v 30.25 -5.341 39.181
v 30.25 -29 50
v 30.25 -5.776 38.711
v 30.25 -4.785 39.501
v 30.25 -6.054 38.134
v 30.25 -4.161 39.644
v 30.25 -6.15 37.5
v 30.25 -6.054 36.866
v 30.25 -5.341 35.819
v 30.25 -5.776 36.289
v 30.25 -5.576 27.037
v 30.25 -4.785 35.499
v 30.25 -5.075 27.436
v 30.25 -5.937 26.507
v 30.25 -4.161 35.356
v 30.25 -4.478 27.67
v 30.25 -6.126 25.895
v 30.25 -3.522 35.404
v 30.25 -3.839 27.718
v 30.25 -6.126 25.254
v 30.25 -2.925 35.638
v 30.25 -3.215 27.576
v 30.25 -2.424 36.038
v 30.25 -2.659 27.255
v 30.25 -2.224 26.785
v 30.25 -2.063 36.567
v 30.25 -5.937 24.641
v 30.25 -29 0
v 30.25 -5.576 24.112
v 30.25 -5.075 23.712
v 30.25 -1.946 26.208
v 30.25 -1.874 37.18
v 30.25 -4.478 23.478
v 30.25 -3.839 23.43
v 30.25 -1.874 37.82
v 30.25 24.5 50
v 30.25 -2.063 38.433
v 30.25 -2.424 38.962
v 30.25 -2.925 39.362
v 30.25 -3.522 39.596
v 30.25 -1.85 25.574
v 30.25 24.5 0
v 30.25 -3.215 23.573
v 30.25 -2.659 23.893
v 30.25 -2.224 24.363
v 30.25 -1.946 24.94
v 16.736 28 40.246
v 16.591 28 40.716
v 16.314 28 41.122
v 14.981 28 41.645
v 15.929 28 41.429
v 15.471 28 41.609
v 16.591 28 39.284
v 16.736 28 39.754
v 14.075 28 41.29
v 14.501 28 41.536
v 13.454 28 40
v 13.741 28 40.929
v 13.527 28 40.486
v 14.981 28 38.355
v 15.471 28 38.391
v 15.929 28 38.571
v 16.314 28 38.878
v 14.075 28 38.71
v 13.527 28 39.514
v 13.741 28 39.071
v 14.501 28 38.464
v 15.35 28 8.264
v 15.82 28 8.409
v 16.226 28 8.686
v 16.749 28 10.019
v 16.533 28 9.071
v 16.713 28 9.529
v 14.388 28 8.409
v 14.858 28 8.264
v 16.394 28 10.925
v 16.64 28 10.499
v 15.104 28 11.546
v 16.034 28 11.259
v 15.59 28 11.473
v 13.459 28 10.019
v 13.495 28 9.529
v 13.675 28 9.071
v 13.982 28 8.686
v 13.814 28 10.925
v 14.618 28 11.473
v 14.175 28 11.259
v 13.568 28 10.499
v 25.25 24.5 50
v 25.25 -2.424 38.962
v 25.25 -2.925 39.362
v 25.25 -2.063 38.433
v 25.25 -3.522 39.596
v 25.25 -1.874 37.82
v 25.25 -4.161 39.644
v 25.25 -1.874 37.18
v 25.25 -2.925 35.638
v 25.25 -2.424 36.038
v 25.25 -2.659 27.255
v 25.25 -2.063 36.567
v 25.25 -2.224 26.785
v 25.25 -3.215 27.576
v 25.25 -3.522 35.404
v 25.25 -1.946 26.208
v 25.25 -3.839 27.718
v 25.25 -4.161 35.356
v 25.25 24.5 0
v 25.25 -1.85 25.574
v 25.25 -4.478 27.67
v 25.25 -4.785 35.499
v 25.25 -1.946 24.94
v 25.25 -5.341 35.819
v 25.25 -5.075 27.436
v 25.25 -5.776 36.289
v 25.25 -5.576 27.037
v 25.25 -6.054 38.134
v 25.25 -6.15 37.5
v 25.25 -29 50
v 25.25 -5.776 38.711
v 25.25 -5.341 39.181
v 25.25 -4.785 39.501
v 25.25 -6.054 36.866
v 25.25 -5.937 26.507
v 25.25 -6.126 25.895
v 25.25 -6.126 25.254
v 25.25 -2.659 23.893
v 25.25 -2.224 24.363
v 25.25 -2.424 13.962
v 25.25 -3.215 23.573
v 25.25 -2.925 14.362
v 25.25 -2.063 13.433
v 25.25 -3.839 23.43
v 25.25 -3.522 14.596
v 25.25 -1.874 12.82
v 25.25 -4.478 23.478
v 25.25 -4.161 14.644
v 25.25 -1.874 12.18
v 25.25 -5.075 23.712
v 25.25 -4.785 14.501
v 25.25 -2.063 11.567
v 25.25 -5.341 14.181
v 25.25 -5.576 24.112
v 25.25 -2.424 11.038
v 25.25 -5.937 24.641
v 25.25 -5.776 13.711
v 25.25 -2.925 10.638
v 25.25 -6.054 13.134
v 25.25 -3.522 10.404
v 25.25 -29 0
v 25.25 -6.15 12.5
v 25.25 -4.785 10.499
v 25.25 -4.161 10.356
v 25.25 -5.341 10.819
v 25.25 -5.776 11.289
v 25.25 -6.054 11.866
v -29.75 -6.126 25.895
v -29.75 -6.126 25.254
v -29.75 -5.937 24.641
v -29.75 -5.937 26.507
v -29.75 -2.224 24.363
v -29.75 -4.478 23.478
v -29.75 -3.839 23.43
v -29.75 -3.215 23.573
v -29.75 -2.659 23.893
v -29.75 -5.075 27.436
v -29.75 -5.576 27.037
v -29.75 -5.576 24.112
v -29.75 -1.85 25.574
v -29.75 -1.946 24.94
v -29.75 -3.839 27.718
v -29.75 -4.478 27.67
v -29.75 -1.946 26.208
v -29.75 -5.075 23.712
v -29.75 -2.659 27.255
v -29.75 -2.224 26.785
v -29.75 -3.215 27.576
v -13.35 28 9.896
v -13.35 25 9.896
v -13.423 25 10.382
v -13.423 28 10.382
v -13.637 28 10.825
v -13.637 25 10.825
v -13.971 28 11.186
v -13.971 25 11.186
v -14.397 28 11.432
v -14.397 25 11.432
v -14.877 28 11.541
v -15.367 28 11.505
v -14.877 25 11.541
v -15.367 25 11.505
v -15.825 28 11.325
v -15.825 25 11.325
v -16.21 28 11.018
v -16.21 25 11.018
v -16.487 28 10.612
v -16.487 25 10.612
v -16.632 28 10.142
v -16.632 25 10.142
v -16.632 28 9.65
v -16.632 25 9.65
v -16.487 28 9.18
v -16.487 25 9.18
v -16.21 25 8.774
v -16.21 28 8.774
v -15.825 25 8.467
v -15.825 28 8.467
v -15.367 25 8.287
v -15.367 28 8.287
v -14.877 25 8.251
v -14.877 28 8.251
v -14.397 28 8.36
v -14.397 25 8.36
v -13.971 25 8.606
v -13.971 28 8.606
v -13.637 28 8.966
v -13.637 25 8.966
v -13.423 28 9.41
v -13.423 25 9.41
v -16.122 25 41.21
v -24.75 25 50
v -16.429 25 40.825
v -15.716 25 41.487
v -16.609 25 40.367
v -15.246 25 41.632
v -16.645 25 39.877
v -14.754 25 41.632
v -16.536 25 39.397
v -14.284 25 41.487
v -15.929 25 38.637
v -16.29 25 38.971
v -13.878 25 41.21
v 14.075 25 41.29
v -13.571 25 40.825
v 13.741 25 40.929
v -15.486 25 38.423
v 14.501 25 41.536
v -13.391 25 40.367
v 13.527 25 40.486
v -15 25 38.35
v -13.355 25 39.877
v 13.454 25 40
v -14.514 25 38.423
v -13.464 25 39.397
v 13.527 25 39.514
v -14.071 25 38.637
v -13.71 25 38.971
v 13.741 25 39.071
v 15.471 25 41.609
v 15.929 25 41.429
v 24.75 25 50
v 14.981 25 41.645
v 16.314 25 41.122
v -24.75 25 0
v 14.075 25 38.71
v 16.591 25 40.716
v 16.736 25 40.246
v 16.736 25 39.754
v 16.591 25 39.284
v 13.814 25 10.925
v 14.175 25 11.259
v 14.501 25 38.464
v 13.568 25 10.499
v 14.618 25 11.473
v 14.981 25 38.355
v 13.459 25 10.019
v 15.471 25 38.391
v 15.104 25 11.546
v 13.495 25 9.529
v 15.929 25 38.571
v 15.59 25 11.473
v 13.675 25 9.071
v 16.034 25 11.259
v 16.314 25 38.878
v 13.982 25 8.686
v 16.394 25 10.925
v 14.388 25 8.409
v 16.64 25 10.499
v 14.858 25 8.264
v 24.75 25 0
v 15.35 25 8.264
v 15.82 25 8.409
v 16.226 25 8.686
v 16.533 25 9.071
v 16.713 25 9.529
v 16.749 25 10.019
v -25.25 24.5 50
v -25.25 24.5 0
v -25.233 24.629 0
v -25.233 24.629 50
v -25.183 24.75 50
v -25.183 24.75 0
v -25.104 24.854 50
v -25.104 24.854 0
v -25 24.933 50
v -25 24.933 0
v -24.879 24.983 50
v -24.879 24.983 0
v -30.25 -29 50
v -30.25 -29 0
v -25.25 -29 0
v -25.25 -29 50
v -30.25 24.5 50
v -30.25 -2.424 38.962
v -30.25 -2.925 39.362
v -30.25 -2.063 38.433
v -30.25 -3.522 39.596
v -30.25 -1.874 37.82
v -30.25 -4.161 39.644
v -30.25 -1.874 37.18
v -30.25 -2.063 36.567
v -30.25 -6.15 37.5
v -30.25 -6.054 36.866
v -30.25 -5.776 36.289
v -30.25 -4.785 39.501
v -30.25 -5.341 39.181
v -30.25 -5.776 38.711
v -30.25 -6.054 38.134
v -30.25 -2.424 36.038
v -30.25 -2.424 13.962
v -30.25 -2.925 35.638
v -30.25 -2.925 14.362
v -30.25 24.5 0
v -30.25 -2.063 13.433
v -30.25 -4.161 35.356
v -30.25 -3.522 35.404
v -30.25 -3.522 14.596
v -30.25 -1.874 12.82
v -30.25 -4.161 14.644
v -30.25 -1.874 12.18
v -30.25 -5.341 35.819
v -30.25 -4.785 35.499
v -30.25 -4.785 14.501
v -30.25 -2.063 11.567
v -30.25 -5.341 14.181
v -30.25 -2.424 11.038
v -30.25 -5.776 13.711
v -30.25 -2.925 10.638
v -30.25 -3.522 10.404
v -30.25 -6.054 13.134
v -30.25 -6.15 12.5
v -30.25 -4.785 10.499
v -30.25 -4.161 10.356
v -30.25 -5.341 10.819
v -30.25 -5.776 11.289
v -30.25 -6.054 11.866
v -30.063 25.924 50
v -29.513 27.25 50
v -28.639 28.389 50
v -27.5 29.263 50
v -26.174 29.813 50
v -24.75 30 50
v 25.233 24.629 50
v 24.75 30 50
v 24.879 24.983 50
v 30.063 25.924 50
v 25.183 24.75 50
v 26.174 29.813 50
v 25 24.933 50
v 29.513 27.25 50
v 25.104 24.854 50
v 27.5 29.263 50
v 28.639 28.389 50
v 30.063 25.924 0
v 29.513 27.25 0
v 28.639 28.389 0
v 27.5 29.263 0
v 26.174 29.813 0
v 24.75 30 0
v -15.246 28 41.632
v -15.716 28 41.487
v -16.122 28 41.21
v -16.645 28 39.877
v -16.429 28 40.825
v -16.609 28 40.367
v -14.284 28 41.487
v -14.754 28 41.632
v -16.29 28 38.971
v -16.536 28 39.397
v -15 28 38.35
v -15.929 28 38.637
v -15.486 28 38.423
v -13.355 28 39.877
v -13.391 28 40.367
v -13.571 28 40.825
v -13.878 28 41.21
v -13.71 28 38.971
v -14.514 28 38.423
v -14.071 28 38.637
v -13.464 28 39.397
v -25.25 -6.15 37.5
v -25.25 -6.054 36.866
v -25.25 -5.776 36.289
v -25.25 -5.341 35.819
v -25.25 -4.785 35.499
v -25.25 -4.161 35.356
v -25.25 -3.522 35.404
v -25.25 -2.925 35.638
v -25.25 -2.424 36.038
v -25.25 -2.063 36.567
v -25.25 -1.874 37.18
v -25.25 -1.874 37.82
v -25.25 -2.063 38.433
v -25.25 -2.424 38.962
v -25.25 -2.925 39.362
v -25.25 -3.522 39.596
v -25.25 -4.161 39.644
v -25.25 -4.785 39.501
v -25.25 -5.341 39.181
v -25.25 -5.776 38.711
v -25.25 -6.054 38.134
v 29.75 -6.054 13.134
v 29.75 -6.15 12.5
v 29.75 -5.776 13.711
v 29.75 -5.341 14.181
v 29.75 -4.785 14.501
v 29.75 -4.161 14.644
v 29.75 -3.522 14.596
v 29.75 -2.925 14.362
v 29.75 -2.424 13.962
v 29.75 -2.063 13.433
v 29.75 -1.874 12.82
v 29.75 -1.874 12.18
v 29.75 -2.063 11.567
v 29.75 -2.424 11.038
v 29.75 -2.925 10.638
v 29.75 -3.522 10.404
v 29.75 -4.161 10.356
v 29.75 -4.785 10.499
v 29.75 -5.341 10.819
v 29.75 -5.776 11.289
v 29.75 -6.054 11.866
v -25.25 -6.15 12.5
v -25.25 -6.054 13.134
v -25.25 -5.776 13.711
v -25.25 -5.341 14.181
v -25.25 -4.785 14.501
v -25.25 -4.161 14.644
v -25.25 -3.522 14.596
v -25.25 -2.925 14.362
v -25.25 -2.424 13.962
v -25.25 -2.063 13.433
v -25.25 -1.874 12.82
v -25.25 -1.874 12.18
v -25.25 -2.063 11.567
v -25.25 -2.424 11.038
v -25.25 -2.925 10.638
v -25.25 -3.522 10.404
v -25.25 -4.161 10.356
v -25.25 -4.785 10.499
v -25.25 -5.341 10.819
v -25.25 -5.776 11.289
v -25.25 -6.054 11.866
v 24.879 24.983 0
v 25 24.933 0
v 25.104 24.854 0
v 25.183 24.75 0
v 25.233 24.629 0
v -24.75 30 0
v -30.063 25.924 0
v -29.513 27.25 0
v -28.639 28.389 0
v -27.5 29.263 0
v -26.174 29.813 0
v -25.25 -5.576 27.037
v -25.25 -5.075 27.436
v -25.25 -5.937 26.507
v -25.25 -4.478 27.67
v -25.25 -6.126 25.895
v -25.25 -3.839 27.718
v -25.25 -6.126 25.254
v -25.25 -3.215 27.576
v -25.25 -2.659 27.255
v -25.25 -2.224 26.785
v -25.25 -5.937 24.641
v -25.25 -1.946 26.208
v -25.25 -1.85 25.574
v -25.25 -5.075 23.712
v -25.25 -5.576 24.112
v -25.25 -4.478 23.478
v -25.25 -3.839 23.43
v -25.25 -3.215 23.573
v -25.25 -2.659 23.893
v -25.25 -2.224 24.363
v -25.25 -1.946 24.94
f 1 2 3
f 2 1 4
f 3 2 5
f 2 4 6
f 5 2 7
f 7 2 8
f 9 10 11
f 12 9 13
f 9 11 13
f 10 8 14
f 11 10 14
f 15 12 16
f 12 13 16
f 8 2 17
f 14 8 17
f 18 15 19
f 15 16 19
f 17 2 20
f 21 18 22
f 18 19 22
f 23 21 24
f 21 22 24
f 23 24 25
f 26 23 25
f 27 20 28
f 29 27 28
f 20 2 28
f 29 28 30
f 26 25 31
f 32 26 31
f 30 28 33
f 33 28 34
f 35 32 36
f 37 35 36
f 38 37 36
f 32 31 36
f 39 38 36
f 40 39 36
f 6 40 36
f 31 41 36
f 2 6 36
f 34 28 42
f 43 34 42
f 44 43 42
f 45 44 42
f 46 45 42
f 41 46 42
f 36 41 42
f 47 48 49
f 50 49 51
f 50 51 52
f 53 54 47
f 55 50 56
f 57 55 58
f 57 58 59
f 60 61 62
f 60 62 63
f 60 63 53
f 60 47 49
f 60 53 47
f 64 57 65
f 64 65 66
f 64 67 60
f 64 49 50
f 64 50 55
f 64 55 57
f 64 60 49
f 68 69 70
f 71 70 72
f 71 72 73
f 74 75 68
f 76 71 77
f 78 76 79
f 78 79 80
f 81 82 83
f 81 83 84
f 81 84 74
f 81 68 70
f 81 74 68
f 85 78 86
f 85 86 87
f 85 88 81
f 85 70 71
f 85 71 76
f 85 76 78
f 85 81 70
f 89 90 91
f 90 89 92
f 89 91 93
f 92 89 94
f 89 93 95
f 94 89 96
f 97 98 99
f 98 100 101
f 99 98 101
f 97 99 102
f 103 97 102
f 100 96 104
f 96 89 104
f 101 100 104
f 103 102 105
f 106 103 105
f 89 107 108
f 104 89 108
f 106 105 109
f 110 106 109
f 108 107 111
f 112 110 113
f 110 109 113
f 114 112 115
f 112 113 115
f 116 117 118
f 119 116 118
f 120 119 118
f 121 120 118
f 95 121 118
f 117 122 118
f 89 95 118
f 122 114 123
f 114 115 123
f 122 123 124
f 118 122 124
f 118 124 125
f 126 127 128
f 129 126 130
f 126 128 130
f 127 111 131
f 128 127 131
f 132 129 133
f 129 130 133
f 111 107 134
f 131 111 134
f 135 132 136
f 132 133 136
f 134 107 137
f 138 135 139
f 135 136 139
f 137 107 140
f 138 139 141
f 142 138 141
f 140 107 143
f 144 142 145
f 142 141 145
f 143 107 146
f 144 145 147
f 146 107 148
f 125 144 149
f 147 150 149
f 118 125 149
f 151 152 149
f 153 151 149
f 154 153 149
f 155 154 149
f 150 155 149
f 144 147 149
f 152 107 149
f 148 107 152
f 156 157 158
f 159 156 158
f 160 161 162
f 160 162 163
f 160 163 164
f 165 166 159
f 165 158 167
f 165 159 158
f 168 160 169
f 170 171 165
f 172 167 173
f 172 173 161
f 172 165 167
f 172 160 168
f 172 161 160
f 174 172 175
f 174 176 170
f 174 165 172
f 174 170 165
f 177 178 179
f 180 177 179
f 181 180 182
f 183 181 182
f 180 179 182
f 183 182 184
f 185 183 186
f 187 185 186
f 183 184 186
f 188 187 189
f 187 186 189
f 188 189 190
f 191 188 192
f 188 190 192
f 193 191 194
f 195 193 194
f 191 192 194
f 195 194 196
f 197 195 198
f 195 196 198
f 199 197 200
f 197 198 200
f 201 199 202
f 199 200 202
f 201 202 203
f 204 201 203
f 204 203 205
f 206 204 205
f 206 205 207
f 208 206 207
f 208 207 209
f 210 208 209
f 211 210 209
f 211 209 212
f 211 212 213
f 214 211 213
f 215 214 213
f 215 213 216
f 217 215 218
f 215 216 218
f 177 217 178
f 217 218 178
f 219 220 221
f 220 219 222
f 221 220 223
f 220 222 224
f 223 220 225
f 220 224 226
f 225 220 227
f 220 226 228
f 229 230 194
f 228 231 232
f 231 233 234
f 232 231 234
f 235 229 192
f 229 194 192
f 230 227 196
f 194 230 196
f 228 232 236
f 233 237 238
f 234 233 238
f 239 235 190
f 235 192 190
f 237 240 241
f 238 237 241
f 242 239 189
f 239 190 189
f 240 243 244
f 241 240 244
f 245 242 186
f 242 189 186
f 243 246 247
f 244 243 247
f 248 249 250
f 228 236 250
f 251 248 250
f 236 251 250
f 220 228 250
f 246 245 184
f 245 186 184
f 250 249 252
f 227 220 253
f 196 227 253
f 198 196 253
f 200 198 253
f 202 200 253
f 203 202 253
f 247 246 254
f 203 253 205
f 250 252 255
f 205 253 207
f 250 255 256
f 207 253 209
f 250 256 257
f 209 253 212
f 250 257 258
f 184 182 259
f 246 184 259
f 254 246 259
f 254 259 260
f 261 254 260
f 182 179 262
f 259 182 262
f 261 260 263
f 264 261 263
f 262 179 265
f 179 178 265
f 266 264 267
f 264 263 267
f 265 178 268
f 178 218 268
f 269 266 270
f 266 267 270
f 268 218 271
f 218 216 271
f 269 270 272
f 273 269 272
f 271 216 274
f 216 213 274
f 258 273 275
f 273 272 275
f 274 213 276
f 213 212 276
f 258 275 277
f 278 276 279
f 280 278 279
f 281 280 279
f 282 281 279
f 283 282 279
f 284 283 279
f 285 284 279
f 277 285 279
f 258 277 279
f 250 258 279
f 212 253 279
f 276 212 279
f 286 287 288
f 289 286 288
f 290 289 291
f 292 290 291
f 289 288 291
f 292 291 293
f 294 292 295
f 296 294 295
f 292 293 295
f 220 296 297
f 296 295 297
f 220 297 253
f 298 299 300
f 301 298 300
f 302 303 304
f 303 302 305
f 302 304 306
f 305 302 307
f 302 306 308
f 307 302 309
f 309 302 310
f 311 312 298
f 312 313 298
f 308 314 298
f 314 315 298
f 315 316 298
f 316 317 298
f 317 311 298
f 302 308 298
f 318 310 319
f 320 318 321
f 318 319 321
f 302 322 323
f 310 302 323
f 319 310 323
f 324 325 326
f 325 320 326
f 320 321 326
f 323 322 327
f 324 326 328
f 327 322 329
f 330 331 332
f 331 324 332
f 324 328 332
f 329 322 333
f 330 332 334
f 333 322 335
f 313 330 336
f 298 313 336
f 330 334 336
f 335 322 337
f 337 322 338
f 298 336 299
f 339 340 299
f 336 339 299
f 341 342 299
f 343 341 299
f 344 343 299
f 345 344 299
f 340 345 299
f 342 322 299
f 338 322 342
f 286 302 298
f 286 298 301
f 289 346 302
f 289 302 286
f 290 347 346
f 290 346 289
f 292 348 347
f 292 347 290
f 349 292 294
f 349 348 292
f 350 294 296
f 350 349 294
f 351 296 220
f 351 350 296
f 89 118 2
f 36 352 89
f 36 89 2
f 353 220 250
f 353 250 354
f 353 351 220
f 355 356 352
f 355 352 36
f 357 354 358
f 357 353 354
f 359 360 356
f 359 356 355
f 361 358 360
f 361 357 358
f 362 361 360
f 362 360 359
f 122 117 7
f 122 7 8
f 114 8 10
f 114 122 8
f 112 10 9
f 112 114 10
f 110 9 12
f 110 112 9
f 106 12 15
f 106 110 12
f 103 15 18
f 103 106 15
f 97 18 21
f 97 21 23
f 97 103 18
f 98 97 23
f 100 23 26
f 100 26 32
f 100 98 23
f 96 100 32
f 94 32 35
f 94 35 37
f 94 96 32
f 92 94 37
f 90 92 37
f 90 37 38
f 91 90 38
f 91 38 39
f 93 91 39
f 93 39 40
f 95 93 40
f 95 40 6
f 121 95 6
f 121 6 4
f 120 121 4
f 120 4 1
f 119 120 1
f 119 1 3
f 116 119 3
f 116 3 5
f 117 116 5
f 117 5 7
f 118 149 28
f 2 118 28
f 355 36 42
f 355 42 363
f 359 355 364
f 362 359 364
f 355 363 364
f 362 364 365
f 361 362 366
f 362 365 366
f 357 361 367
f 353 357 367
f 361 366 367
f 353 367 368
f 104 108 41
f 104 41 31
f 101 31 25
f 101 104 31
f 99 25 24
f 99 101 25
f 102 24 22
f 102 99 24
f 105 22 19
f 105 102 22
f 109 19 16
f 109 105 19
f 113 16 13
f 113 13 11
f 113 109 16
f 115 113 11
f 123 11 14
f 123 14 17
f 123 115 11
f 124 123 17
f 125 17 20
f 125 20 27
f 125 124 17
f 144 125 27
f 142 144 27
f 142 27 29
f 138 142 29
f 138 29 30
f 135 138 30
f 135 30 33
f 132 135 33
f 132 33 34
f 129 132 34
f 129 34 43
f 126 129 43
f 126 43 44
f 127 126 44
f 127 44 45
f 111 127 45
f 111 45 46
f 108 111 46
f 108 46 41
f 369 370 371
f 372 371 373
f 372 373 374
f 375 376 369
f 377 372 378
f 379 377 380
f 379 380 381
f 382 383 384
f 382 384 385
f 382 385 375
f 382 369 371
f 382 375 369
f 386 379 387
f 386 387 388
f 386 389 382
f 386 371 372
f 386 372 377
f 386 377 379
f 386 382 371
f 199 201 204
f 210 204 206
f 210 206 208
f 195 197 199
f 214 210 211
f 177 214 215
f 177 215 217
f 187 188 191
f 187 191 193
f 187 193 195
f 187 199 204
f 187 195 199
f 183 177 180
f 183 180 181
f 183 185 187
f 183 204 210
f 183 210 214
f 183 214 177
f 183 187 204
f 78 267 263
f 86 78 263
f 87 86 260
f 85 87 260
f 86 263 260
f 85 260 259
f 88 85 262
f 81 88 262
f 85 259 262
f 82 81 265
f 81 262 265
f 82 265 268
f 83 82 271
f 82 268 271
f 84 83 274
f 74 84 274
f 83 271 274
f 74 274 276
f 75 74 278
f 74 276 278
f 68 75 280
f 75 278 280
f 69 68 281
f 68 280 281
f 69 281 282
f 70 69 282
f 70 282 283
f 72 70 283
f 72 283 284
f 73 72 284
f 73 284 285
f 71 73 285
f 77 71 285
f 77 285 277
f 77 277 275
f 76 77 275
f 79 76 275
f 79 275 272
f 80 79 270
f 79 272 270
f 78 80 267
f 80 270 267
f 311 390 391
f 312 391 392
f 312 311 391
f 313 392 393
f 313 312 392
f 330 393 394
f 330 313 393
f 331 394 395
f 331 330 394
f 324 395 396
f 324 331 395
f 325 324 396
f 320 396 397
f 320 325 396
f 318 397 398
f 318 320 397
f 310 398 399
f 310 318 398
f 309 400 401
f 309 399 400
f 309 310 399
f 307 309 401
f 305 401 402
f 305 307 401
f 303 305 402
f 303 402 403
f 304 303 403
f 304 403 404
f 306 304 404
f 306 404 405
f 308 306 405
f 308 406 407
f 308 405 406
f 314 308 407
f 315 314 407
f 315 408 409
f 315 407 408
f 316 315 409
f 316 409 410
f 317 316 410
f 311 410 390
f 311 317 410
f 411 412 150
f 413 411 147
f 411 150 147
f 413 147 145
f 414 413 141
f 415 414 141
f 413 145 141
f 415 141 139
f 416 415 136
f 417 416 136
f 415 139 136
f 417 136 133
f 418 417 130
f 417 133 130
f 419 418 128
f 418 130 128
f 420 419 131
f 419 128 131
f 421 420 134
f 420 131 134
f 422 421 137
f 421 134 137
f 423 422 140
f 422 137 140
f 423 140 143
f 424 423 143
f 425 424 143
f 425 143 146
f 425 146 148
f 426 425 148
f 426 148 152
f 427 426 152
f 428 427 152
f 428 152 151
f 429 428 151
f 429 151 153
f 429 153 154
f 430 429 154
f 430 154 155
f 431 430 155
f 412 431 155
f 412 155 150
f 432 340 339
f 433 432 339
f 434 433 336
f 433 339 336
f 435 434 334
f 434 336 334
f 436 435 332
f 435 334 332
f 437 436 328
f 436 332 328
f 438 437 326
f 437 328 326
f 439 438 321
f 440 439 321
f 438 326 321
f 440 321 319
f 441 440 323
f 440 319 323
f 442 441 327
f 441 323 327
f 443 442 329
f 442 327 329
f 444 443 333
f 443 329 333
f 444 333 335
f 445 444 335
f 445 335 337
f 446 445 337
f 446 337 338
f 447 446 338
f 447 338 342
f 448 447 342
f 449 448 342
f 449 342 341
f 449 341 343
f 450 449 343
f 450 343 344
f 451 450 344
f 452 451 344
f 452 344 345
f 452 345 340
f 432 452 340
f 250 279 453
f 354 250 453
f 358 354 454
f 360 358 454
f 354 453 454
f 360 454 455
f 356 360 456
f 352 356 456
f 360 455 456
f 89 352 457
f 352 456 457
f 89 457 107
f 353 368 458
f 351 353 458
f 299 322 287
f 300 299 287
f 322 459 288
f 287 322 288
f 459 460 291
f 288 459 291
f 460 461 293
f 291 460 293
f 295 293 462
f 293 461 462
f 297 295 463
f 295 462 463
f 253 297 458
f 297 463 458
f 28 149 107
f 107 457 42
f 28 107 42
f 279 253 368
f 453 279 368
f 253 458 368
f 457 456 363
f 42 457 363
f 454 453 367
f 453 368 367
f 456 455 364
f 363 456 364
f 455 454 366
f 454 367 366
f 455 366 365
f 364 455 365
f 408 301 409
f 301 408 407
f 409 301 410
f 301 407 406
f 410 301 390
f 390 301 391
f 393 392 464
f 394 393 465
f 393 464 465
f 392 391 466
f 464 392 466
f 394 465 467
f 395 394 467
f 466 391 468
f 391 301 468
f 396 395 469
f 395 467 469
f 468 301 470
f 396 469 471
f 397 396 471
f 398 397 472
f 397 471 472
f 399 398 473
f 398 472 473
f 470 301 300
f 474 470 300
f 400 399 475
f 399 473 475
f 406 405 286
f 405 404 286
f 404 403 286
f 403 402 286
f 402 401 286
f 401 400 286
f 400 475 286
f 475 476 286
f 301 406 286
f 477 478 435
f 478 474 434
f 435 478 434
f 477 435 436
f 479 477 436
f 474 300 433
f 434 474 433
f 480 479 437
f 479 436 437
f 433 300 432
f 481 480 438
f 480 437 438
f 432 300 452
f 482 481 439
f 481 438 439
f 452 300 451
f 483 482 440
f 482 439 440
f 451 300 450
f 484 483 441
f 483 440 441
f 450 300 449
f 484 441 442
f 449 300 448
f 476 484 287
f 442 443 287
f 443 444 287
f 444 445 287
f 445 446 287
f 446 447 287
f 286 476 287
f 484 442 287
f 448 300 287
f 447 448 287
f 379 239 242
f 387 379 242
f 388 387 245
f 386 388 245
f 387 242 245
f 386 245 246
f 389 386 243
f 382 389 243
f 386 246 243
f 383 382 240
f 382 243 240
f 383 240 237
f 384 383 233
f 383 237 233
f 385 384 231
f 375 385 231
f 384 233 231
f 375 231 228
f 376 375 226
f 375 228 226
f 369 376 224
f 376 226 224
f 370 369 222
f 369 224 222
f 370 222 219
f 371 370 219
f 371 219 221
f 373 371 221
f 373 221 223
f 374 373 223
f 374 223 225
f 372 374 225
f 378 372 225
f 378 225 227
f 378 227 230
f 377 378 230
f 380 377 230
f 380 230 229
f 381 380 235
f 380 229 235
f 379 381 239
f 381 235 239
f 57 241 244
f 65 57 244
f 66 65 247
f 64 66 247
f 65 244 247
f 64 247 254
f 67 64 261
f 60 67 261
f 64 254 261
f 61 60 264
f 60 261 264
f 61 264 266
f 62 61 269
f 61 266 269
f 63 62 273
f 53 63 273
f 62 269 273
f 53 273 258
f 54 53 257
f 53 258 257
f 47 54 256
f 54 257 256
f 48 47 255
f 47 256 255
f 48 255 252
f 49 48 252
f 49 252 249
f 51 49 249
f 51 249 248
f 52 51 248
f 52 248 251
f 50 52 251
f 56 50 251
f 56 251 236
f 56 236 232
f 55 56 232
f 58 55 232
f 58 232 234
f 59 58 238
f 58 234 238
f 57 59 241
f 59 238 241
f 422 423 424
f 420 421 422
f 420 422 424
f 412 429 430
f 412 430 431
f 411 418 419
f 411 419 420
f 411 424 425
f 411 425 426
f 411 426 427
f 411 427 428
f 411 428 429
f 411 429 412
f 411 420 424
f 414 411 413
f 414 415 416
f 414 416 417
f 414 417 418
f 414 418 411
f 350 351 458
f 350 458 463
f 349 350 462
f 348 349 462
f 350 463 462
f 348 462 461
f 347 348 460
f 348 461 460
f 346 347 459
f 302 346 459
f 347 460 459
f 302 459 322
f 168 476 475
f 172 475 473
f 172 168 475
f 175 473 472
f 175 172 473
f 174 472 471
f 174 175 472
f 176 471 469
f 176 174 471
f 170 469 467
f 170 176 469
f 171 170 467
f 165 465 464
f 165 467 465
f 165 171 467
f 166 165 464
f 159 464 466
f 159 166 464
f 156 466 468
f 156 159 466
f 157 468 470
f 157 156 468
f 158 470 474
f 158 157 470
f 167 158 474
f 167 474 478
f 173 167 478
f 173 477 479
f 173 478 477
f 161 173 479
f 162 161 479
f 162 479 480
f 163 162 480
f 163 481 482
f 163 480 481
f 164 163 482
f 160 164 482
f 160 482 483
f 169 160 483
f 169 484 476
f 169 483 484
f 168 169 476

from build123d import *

# Parameters (mm, degrees)
BASE_FLANGE3_DEPTH = 50
SKETCH21_R         = 1.65
CUT_EXTRUDE1_DEPTH = 3
CIRPATTERN1_COUNT  = 4
SKETCH22_R         = 2.15
CUT_EXTRUDE4_DEPTH = 60
CUT_EXTRUDE3_START = -60
SKETCH23_R         = 2.15
CUT_EXTRUDE3_DEPTH = 60


# Read off the part's stored shape, not the designer's step: Base-Flange3
with BuildPart() as part:
    # Base-Flange3 outline → Base-Flange3 (new body)
    with BuildSketch(Plane.XY):
        with BuildLine():
            Line((-30.25, 24.5), (-30.25, -29))
            Line((-30.25, -29), (-25.25, -29))
            Line((-25.25, -29), (-25.25, 24.5))
            ThreePointArc((-25.25, 24.5), (-25.103553391, 24.853553391), (-24.75, 25))
            Line((-24.75, 25), (24.75, 25))
            ThreePointArc((24.75, 25), (25.103553391, 24.853553391), (25.25, 24.5))
            Line((25.25, 24.5), (25.25, -29))
            Line((25.25, -29), (30.25, -29))
            Line((30.25, -29), (30.25, 24.5))
            ThreePointArc((30.25, 24.5), (28.639087297, 28.389087297), (24.75, 30))
            Line((24.75, 30), (-24.75, 30))
            ThreePointArc((-24.75, 30), (-28.639087297, 28.389087297), (-30.25, 24.5))
        make_face()
    extrude(amount=BASE_FLANGE3_DEPTH)

    # Sketch21 → Cut-Extrude1 (cut)
    with BuildSketch(Plane.XZ.offset(-25)):
        with Locations(Location((-15, 40, 0), (0, 0, 270))):
            Circle(SKETCH21_R)
    cut_extrude1 = extrude(amount=-CUT_EXTRUDE1_DEPTH, mode=Mode.SUBTRACT)

    # CirPattern1: Cut-Extrude1 ×4 about axis
    cirpattern1_axis = Axis((0.052016033, 0, 24.947983967), (0, 1, 0))
    for i in range(1, CIRPATTERN1_COUNT):
        add(cut_extrude1.rotate(cirpattern1_axis, i * 360 / CIRPATTERN1_COUNT), mode=Mode.SUBTRACT)

    # Sketch22 → Cut-Extrude4 (cut)
    with BuildSketch(Plane.ZY.offset(30.25)):
        with Locations(Location((12.5, -4, 0), (0, 0, 270))):
            Circle(SKETCH22_R)
    cut_extrude4 = extrude(amount=-CUT_EXTRUDE4_DEPTH, mode=Mode.SUBTRACT)

    # Mirror2: Cut-Extrude4 across plane
    add(cut_extrude4.mirror(Plane.XY.offset(25)), mode=Mode.SUBTRACT)

    # Sketch23 → Cut-Extrude3 (cut)
    with BuildSketch(Plane(origin=(30.25, 0, 0), x_dir=(0, 0, -1), z_dir=(1, 0, 0)).offset(CUT_EXTRUDE3_START)):
        with Locations(Location((-25.574194975, -4, 0), (0, 0, 90))):
            Circle(SKETCH23_R)
        with Locations(Location((-37.5, -4, 0), (0, 0, 270))):
            Circle(SKETCH23_R)
    extrude(amount=CUT_EXTRUDE3_DEPTH, mode=Mode.SUBTRACT)


solid = part.part
